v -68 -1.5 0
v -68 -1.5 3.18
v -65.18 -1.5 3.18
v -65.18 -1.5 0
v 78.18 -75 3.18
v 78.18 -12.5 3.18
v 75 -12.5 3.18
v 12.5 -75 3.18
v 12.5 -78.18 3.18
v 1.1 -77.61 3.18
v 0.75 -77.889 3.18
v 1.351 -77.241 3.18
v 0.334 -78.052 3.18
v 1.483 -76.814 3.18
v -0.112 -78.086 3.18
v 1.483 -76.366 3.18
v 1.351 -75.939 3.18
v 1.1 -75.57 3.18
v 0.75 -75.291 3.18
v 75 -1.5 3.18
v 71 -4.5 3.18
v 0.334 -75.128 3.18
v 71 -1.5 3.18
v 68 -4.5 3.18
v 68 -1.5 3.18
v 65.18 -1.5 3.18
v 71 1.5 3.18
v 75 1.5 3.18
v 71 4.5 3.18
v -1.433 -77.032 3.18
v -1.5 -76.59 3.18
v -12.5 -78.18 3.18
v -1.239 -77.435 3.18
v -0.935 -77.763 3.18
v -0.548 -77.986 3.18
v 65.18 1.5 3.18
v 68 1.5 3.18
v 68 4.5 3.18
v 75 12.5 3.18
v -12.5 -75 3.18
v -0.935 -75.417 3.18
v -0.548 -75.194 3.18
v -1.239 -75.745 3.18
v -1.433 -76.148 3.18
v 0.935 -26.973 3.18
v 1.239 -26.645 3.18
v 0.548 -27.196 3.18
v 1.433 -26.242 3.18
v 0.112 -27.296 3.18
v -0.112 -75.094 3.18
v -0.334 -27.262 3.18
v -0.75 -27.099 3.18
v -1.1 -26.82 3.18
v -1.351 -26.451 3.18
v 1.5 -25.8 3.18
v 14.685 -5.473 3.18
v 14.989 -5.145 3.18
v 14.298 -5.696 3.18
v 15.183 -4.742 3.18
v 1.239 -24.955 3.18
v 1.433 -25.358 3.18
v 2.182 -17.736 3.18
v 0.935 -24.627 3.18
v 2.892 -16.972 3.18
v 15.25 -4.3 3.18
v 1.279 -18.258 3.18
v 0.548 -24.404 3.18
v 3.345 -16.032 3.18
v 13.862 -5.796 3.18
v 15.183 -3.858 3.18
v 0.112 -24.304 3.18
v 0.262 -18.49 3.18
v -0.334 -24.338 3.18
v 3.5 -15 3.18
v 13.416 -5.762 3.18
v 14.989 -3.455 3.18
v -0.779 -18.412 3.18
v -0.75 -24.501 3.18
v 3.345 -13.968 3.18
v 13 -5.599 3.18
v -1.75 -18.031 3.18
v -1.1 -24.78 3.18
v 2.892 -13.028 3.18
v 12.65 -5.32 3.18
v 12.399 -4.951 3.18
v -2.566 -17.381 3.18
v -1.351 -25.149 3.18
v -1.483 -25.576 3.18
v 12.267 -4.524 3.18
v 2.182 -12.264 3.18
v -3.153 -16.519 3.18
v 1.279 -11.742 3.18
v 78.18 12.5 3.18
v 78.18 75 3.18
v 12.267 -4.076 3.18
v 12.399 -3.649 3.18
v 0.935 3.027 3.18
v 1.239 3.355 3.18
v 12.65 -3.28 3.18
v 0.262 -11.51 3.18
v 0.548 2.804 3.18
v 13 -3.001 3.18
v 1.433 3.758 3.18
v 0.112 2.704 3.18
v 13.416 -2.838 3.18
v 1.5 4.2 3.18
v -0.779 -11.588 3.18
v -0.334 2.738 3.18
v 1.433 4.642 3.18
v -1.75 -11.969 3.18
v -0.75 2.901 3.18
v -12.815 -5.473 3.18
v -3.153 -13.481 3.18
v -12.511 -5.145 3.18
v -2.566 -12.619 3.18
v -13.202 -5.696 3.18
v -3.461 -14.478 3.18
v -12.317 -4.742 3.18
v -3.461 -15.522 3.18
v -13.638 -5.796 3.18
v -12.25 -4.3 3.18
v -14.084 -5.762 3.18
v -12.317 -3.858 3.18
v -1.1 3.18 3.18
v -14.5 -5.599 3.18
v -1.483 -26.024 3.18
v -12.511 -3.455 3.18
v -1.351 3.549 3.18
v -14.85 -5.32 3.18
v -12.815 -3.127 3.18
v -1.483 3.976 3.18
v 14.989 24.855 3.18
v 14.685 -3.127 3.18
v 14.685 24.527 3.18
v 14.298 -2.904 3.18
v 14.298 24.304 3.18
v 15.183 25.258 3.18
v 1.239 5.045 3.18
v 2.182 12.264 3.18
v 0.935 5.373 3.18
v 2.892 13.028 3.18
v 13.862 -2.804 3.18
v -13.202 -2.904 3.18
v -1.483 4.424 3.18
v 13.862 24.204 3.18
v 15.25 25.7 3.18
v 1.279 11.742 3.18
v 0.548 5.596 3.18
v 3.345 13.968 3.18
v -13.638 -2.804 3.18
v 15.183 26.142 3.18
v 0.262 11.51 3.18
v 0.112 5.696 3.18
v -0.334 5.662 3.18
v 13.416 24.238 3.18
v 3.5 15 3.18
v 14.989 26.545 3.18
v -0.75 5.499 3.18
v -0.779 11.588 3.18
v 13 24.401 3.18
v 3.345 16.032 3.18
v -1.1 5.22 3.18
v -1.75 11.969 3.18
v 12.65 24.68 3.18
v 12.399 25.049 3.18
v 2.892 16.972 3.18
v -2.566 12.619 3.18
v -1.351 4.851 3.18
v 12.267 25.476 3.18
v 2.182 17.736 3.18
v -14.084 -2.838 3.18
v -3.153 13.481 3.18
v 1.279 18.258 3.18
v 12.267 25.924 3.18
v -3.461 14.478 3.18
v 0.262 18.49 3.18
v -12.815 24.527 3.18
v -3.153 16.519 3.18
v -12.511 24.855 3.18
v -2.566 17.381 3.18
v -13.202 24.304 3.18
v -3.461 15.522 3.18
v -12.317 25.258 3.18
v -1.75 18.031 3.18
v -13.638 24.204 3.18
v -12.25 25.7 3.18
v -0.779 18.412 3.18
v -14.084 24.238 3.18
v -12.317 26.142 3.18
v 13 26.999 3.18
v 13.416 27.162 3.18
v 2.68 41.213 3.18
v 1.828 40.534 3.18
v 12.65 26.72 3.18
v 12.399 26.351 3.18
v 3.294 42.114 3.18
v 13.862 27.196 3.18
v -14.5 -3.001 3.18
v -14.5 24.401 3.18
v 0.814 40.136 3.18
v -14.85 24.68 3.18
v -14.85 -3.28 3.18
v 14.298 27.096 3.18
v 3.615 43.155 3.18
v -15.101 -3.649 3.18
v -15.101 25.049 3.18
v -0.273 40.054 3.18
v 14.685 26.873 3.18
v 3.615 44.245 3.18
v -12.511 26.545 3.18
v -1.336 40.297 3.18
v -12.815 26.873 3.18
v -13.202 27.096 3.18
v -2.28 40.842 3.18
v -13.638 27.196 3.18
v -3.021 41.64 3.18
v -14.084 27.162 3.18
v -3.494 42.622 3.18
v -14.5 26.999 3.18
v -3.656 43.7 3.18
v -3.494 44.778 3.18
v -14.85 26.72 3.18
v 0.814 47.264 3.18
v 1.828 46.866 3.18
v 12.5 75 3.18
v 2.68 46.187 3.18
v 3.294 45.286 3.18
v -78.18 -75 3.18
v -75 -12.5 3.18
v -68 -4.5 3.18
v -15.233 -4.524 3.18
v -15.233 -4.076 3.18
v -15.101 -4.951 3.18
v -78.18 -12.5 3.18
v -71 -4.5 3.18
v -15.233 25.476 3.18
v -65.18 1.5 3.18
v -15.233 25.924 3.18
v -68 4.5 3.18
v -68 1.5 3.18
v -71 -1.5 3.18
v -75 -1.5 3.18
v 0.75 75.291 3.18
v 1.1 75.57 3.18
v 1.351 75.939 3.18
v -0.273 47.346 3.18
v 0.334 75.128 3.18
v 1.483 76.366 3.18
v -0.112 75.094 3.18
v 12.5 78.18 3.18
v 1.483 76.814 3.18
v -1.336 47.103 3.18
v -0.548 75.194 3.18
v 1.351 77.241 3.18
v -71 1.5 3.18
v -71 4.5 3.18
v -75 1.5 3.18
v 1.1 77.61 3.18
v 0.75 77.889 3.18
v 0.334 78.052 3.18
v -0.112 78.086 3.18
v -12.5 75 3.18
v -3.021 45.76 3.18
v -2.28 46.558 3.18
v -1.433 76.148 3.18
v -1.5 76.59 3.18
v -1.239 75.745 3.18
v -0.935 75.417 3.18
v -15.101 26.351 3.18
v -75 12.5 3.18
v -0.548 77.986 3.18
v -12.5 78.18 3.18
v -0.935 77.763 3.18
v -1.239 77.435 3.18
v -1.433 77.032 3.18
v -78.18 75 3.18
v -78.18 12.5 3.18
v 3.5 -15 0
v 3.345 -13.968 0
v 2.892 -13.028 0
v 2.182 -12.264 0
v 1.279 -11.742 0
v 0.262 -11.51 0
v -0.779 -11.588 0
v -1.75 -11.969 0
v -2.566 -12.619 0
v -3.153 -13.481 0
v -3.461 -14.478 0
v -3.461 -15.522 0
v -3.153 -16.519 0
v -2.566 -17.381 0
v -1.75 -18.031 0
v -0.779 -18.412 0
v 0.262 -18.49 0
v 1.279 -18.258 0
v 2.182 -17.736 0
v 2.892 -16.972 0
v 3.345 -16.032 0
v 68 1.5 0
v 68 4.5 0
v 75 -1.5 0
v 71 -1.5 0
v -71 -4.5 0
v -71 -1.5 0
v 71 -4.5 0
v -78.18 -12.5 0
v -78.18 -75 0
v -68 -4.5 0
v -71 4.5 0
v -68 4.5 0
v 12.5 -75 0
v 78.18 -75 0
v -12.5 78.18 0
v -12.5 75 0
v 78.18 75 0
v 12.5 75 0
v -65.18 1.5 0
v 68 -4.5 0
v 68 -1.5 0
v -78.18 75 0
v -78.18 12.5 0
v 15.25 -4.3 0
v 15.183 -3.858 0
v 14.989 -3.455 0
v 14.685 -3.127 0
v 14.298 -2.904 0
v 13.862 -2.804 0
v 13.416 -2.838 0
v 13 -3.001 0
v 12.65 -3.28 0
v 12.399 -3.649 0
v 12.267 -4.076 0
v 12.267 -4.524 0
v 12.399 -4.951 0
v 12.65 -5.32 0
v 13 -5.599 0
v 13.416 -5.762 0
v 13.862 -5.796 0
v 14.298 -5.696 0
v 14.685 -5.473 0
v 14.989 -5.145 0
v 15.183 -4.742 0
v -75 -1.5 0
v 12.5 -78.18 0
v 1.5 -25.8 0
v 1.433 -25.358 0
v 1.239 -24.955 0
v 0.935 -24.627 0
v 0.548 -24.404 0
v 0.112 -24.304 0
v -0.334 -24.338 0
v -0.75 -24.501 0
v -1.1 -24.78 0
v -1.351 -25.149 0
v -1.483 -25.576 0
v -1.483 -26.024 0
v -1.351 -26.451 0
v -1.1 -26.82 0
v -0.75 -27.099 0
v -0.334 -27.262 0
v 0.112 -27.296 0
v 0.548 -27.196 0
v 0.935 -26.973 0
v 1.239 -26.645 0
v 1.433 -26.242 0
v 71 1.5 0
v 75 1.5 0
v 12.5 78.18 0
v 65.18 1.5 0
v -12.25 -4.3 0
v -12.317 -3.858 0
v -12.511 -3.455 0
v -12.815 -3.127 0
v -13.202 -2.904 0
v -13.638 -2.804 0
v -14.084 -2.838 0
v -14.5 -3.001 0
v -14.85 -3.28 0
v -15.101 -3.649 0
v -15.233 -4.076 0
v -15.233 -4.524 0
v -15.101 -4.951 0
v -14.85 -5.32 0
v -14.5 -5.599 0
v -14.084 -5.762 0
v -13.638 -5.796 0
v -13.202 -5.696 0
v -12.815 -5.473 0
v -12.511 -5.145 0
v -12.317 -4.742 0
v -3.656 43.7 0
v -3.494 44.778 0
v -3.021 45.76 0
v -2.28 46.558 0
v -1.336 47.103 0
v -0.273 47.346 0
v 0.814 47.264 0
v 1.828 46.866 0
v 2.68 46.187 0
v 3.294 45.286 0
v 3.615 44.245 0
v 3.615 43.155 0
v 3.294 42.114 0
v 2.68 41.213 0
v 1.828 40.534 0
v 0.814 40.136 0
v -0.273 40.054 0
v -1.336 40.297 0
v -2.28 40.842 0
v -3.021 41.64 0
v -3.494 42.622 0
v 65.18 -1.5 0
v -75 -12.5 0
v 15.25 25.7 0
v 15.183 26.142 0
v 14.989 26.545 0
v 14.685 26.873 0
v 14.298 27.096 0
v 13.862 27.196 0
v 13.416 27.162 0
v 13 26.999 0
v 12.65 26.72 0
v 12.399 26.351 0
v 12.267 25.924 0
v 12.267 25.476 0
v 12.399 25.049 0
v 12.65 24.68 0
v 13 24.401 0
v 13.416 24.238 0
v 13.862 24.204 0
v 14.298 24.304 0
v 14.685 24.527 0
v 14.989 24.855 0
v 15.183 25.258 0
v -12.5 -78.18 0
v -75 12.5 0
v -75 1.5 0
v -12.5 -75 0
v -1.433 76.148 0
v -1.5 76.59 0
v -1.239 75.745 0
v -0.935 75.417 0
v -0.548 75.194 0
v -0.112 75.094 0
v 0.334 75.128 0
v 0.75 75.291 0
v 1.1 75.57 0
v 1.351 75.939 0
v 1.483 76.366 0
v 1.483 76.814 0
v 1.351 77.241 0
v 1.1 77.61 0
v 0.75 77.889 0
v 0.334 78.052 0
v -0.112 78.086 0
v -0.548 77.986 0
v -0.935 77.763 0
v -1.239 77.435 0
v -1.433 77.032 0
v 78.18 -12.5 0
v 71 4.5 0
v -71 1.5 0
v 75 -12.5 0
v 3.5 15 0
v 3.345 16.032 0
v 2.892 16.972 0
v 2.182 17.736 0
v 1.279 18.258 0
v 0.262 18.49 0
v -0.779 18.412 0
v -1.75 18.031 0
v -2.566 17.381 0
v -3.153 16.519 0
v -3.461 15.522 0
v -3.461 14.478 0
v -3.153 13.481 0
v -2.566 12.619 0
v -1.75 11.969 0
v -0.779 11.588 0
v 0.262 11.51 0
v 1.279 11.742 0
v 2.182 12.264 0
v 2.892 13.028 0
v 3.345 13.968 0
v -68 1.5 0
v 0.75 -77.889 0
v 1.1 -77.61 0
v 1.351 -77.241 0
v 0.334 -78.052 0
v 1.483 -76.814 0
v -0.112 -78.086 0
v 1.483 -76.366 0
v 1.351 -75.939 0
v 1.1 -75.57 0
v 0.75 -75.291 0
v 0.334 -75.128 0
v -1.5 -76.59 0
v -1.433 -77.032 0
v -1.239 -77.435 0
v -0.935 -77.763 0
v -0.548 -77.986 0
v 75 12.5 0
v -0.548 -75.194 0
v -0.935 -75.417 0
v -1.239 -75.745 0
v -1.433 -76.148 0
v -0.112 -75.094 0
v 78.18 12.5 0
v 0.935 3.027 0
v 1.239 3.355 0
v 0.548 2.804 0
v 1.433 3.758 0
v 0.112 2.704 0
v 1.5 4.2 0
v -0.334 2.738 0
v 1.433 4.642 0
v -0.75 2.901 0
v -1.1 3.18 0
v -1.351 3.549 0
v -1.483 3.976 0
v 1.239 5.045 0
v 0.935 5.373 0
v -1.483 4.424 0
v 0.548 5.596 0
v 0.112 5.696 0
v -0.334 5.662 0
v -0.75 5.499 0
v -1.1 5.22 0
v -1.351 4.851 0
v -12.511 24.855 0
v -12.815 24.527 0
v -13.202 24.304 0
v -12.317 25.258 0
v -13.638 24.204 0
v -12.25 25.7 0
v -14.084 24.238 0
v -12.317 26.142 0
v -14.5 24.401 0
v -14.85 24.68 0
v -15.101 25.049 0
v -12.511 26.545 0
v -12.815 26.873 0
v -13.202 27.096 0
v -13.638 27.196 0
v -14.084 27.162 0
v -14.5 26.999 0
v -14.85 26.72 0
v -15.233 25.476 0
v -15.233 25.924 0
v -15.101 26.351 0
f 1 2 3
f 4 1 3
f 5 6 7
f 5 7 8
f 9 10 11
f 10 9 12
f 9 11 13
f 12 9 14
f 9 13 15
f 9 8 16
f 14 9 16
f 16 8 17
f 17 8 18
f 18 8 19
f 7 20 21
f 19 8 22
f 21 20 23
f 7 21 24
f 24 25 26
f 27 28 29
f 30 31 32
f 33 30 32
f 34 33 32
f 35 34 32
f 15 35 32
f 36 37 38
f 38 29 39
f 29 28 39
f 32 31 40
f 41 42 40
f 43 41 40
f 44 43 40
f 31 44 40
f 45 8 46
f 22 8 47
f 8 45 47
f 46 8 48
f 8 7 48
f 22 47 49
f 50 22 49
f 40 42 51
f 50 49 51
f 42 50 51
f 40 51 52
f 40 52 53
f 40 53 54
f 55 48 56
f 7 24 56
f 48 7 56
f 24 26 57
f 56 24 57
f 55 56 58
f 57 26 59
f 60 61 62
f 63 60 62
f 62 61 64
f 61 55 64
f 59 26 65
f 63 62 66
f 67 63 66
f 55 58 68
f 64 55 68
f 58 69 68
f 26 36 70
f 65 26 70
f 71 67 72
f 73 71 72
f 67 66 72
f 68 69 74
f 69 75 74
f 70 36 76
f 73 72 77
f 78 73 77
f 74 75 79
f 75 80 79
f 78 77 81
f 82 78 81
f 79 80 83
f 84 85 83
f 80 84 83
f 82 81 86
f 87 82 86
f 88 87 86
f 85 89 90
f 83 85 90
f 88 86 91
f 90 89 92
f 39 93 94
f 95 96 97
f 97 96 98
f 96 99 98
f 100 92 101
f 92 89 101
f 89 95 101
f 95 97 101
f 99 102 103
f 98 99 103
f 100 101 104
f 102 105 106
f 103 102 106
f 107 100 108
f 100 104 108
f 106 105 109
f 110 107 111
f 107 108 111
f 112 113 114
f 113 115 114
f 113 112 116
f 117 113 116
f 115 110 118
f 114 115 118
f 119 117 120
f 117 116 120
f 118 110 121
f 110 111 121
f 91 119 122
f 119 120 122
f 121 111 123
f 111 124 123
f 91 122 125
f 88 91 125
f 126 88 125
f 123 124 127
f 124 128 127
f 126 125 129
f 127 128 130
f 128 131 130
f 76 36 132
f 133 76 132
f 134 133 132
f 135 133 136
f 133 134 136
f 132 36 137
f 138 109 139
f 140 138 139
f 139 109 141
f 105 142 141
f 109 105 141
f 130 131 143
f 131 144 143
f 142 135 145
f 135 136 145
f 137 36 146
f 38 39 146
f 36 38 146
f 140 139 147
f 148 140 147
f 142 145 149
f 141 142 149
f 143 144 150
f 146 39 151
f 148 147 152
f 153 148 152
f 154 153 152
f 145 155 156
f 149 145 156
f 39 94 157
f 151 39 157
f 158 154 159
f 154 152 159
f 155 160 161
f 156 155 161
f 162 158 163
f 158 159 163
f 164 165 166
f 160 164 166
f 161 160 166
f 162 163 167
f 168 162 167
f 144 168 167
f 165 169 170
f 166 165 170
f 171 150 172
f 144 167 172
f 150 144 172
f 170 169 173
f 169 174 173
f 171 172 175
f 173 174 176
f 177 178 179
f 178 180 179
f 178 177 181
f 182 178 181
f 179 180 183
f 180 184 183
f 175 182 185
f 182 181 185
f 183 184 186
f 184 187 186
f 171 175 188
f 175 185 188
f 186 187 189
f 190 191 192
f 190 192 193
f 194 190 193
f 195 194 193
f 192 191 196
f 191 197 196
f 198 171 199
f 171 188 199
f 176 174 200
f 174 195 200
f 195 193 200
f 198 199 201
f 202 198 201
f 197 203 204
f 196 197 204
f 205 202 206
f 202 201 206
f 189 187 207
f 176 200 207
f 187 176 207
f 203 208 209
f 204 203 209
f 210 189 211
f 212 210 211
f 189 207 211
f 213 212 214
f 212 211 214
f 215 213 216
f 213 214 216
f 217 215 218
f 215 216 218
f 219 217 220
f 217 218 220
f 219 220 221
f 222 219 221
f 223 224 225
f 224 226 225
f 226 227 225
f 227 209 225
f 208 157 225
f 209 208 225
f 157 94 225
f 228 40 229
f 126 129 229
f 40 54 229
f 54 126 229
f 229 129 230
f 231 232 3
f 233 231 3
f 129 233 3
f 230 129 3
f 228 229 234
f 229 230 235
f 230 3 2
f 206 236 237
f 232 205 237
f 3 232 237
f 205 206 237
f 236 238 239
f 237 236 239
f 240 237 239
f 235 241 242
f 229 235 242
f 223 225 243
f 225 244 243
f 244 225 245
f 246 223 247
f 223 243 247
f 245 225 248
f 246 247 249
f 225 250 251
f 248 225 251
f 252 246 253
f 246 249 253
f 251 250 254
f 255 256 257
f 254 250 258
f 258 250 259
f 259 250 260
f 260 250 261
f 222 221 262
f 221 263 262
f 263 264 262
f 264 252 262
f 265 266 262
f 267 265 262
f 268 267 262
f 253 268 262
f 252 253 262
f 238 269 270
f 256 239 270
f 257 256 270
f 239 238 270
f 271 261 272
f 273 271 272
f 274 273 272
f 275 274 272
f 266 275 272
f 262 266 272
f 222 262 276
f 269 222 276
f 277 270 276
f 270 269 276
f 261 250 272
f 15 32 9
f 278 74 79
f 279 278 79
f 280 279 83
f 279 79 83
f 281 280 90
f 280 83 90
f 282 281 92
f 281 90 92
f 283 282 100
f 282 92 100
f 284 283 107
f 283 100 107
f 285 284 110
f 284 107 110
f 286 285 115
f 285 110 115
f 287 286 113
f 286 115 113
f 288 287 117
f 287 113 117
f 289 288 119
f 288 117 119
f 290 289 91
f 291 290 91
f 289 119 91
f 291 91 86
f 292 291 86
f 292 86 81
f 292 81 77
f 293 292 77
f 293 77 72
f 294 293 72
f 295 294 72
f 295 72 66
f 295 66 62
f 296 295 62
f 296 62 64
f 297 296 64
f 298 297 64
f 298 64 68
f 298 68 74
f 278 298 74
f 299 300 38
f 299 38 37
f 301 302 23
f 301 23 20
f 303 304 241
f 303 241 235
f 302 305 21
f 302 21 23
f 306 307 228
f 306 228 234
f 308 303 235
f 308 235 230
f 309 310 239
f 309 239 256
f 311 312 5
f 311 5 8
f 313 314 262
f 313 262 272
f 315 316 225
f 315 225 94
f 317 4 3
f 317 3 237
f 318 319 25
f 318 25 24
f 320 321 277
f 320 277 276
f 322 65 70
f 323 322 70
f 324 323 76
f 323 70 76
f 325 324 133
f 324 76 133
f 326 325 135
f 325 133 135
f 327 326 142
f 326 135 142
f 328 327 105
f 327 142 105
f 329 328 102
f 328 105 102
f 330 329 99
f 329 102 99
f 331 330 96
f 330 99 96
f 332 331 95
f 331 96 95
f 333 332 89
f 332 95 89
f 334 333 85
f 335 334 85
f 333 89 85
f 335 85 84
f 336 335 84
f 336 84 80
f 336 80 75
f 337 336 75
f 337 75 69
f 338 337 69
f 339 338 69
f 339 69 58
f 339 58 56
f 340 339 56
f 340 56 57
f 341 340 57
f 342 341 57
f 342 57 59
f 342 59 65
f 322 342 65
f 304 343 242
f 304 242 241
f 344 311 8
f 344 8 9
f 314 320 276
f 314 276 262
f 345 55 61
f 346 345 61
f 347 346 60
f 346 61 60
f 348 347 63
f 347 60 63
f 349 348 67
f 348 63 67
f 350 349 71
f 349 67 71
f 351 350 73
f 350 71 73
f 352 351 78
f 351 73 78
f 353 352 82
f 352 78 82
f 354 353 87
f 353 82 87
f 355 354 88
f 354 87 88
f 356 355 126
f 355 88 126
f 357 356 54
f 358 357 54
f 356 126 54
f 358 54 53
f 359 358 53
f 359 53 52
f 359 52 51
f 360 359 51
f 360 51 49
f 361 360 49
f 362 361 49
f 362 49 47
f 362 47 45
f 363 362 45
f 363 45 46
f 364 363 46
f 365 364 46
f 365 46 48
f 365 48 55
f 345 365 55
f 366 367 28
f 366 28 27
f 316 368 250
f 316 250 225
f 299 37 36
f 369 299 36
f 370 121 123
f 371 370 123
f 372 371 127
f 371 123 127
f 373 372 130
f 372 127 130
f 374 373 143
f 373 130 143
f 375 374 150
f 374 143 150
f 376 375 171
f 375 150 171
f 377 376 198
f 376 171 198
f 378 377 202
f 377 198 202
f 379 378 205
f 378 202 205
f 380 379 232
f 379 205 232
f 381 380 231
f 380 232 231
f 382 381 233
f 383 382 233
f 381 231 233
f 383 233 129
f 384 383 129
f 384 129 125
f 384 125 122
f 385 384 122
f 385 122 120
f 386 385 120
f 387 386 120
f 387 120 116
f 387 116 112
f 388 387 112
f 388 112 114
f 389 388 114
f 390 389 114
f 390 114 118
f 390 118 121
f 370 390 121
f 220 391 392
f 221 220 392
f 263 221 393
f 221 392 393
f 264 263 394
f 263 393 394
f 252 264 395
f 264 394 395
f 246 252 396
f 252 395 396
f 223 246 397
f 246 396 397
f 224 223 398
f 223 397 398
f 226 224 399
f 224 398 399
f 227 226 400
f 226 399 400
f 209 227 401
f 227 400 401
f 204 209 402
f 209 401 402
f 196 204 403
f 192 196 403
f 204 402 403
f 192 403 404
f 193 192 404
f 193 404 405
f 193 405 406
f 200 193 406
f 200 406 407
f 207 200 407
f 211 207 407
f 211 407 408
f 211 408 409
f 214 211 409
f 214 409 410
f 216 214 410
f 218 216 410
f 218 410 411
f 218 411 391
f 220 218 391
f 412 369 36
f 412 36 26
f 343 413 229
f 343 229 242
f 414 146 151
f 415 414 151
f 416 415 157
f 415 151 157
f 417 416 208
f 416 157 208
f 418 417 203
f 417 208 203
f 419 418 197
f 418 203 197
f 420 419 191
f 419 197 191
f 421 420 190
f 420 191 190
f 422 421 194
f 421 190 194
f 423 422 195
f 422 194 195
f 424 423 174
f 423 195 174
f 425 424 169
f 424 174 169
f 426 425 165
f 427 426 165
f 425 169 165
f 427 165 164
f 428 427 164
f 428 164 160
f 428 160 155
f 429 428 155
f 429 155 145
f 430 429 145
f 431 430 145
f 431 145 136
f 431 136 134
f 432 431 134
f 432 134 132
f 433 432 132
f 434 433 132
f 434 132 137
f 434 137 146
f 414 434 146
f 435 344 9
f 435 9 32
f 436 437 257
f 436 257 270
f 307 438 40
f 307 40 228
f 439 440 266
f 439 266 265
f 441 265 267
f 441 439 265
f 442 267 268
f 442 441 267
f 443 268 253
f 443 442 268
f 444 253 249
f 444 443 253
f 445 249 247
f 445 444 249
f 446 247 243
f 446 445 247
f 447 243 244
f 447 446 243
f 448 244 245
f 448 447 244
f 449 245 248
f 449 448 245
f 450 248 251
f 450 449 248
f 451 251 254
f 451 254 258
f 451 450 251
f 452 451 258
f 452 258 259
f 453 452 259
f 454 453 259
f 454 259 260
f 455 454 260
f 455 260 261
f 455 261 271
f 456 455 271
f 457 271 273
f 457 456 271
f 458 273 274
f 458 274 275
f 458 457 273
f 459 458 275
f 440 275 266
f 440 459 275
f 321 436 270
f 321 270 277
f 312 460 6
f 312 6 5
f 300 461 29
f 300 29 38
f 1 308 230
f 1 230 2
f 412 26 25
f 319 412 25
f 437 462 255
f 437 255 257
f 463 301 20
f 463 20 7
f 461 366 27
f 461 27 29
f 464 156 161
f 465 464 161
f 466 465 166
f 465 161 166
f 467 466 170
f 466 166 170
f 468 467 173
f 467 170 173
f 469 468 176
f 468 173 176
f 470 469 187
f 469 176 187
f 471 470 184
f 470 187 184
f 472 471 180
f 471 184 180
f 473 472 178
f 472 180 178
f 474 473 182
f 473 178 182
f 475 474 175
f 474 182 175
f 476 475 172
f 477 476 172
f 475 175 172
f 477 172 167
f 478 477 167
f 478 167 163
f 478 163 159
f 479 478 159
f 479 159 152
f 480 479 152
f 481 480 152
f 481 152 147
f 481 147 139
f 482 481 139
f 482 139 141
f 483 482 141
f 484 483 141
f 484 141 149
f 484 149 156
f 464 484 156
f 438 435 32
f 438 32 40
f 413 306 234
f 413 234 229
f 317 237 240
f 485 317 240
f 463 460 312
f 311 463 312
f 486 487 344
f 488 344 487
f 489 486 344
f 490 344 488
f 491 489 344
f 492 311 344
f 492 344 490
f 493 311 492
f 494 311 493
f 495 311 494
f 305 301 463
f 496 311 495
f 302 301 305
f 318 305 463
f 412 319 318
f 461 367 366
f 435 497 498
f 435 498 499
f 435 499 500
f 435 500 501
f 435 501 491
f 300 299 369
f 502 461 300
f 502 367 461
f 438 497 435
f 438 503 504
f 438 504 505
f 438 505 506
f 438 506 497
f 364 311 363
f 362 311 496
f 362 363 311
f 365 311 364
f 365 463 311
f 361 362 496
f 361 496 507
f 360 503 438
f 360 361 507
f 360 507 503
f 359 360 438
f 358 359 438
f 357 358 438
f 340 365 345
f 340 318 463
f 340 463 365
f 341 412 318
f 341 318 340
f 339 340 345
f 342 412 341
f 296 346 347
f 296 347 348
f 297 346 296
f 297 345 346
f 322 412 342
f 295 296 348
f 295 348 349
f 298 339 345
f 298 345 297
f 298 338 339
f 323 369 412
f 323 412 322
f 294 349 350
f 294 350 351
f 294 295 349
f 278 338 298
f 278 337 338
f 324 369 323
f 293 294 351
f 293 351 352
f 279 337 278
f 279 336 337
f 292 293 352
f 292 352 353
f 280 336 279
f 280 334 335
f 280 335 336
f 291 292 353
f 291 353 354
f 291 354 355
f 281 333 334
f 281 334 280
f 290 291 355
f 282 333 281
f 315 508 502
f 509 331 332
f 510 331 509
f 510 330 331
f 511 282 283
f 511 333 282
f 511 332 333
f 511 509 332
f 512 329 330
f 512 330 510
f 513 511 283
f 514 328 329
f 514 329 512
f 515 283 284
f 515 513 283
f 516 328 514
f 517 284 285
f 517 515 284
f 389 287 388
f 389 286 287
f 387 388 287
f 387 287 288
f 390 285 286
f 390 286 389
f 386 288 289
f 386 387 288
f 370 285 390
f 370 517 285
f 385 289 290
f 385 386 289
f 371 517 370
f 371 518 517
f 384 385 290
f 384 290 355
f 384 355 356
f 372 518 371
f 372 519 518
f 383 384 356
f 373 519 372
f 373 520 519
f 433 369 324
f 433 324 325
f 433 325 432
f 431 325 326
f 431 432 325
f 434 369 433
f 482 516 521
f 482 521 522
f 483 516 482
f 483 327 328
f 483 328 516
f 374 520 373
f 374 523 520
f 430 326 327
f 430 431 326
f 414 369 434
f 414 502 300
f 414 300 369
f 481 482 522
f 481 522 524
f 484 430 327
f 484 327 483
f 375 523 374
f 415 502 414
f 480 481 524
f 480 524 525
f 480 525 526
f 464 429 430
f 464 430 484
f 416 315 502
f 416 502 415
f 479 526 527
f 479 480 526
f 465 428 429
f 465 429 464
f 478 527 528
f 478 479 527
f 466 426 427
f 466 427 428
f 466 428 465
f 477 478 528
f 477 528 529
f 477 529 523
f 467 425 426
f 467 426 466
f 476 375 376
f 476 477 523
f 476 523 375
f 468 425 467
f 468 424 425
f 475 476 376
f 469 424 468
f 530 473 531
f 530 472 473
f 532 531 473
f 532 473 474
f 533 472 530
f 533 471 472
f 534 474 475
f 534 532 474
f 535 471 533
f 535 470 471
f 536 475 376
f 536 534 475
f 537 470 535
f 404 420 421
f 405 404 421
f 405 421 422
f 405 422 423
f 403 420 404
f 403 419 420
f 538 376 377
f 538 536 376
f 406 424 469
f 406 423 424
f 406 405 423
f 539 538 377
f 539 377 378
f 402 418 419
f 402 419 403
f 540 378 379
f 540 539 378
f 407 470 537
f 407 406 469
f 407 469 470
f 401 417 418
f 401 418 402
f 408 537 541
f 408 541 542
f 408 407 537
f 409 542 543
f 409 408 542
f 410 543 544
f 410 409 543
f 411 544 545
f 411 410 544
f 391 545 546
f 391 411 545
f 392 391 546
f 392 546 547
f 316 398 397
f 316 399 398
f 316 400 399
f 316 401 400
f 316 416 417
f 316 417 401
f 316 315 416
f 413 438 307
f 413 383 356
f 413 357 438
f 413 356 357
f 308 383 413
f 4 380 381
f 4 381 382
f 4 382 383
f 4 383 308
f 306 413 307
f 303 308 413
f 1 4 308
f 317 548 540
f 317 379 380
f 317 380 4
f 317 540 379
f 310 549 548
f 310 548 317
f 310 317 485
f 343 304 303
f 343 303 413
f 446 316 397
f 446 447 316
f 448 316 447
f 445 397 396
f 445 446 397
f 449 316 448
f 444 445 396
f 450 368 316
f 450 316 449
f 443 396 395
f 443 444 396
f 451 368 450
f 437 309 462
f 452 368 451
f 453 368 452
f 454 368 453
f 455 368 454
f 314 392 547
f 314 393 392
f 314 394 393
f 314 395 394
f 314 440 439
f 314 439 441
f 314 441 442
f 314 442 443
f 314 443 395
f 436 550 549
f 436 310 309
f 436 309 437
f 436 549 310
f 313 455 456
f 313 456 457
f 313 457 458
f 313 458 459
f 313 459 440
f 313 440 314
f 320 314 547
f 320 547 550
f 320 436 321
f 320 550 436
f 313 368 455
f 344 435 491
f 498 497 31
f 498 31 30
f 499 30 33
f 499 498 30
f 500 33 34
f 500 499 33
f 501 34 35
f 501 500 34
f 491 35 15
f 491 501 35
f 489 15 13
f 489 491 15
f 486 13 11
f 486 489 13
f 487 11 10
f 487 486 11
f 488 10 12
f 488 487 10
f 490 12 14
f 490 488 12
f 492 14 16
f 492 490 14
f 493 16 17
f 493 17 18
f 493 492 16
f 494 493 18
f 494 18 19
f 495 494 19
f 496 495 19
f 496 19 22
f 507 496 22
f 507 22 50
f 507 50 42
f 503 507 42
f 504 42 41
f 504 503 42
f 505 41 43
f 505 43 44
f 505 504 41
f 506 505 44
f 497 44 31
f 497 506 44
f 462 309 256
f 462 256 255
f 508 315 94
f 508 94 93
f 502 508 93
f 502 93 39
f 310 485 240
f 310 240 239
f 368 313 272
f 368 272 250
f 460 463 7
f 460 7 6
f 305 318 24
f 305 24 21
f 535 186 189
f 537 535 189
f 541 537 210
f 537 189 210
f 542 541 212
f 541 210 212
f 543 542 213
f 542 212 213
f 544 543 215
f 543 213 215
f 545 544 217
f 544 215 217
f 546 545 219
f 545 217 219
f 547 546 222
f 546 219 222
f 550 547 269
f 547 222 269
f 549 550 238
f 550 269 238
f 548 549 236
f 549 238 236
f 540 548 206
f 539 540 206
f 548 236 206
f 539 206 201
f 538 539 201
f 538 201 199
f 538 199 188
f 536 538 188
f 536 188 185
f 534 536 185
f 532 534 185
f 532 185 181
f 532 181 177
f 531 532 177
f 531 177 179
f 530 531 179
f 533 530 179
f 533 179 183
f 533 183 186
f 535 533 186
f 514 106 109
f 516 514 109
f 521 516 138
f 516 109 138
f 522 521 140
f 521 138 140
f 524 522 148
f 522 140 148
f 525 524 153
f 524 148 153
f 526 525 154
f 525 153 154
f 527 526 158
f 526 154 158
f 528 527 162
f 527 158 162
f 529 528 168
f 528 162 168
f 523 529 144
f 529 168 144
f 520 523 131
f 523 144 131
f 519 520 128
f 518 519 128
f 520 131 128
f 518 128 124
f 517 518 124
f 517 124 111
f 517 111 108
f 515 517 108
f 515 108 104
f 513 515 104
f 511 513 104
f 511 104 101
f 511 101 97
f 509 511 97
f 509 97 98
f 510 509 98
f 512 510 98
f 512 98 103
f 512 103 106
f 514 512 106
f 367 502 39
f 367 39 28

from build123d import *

# Parameters (mm, degrees)
SKETCH1_R           = 1.5
BOSS_EXTRUDE1_DEPTH = 3.18
SKETCH2_R           = 1.5
SKETCH2_R_2         = 3.5
CUT_EXTRUDE1_DEPTH  = 10
SKETCH3_R           = 3.656100146
CUT_EXTRUDE2_DEPTH  = 10


with BuildPart() as part:
    # Sketch1 → Boss-Extrude1 (new body)
    with BuildSketch(Plane.XY):
        Polygon((-78.18, 75), (-12.5, 75), (-12.5, 78.18), (12.5, 78.18), (12.5, 75), (78.18, 75), (78.18, 12.5), (75, 12.5), (75, 1.5), (71, 1.5), (71, 4.5), (68, 4.5), (68, 1.5), (65.18, 1.5), (65.18, -1.5), (68, -1.5), (68, -4.5), (71, -4.5), (71, -1.5), (75, -1.5), (75, -12.5), (78.18, -12.5), (78.18, -75), (12.5, -75), (12.5, -78.18), (-12.5, -78.18), (-12.5, -75), (-78.18, -75), (-78.18, -12.5), (-75, -12.5), (-75, -1.5), (-71, -1.5), (-71, -4.5), (-68, -4.5), (-68, -1.5), (-65.18, -1.5), (-65.18, 1.5), (-68, 1.5), (-68, 4.5), (-71, 4.5), (-71, 1.5), (-75, 1.5), (-75, 12.5), (-78.18, 12.5), align=None)
        with Locations(Location((0, -76.59, 0), (0, 0, 180))):
            Circle(SKETCH1_R, mode=Mode.SUBTRACT)
        with Locations(Location((0, 76.59, 0), (0, 0, 180))):
            Circle(SKETCH1_R, mode=Mode.SUBTRACT)
    extrude(amount=BOSS_EXTRUDE1_DEPTH)

    # Sketch2 → Cut-Extrude1 (cut)
    with BuildSketch(Plane.XY.offset(3.18)):
        with Locations((-13.75, -4.3)):
            Circle(SKETCH2_R)
        with Locations((0, -25.8)):
            Circle(SKETCH2_R)
        with Locations((13.75, -4.3)):
            Circle(SKETCH2_R)
        with Locations((0, 4.2)):
            Circle(SKETCH2_R)
        with Locations((13.75, 25.7)):
            Circle(SKETCH2_R)
        with Locations((-13.75, 25.7)):
            Circle(SKETCH2_R)
        with Locations((0, 15)):
            Circle(SKETCH2_R_2)
        with Locations((0, -15)):
            Circle(SKETCH2_R_2)
    extrude(amount=-CUT_EXTRUDE1_DEPTH, mode=Mode.SUBTRACT)

    # Sketch3 → Cut-Extrude2 (cut)
    with BuildSketch(Plane(origin=(0, 0, 0), x_dir=(-1, 0, 0), z_dir=(0, 0, -1))):
        with Locations((1e-09, 43.7)):
            Circle(SKETCH3_R)
    extrude(amount=-CUT_EXTRUDE2_DEPTH, mode=Mode.SUBTRACT)


solid = part.part
